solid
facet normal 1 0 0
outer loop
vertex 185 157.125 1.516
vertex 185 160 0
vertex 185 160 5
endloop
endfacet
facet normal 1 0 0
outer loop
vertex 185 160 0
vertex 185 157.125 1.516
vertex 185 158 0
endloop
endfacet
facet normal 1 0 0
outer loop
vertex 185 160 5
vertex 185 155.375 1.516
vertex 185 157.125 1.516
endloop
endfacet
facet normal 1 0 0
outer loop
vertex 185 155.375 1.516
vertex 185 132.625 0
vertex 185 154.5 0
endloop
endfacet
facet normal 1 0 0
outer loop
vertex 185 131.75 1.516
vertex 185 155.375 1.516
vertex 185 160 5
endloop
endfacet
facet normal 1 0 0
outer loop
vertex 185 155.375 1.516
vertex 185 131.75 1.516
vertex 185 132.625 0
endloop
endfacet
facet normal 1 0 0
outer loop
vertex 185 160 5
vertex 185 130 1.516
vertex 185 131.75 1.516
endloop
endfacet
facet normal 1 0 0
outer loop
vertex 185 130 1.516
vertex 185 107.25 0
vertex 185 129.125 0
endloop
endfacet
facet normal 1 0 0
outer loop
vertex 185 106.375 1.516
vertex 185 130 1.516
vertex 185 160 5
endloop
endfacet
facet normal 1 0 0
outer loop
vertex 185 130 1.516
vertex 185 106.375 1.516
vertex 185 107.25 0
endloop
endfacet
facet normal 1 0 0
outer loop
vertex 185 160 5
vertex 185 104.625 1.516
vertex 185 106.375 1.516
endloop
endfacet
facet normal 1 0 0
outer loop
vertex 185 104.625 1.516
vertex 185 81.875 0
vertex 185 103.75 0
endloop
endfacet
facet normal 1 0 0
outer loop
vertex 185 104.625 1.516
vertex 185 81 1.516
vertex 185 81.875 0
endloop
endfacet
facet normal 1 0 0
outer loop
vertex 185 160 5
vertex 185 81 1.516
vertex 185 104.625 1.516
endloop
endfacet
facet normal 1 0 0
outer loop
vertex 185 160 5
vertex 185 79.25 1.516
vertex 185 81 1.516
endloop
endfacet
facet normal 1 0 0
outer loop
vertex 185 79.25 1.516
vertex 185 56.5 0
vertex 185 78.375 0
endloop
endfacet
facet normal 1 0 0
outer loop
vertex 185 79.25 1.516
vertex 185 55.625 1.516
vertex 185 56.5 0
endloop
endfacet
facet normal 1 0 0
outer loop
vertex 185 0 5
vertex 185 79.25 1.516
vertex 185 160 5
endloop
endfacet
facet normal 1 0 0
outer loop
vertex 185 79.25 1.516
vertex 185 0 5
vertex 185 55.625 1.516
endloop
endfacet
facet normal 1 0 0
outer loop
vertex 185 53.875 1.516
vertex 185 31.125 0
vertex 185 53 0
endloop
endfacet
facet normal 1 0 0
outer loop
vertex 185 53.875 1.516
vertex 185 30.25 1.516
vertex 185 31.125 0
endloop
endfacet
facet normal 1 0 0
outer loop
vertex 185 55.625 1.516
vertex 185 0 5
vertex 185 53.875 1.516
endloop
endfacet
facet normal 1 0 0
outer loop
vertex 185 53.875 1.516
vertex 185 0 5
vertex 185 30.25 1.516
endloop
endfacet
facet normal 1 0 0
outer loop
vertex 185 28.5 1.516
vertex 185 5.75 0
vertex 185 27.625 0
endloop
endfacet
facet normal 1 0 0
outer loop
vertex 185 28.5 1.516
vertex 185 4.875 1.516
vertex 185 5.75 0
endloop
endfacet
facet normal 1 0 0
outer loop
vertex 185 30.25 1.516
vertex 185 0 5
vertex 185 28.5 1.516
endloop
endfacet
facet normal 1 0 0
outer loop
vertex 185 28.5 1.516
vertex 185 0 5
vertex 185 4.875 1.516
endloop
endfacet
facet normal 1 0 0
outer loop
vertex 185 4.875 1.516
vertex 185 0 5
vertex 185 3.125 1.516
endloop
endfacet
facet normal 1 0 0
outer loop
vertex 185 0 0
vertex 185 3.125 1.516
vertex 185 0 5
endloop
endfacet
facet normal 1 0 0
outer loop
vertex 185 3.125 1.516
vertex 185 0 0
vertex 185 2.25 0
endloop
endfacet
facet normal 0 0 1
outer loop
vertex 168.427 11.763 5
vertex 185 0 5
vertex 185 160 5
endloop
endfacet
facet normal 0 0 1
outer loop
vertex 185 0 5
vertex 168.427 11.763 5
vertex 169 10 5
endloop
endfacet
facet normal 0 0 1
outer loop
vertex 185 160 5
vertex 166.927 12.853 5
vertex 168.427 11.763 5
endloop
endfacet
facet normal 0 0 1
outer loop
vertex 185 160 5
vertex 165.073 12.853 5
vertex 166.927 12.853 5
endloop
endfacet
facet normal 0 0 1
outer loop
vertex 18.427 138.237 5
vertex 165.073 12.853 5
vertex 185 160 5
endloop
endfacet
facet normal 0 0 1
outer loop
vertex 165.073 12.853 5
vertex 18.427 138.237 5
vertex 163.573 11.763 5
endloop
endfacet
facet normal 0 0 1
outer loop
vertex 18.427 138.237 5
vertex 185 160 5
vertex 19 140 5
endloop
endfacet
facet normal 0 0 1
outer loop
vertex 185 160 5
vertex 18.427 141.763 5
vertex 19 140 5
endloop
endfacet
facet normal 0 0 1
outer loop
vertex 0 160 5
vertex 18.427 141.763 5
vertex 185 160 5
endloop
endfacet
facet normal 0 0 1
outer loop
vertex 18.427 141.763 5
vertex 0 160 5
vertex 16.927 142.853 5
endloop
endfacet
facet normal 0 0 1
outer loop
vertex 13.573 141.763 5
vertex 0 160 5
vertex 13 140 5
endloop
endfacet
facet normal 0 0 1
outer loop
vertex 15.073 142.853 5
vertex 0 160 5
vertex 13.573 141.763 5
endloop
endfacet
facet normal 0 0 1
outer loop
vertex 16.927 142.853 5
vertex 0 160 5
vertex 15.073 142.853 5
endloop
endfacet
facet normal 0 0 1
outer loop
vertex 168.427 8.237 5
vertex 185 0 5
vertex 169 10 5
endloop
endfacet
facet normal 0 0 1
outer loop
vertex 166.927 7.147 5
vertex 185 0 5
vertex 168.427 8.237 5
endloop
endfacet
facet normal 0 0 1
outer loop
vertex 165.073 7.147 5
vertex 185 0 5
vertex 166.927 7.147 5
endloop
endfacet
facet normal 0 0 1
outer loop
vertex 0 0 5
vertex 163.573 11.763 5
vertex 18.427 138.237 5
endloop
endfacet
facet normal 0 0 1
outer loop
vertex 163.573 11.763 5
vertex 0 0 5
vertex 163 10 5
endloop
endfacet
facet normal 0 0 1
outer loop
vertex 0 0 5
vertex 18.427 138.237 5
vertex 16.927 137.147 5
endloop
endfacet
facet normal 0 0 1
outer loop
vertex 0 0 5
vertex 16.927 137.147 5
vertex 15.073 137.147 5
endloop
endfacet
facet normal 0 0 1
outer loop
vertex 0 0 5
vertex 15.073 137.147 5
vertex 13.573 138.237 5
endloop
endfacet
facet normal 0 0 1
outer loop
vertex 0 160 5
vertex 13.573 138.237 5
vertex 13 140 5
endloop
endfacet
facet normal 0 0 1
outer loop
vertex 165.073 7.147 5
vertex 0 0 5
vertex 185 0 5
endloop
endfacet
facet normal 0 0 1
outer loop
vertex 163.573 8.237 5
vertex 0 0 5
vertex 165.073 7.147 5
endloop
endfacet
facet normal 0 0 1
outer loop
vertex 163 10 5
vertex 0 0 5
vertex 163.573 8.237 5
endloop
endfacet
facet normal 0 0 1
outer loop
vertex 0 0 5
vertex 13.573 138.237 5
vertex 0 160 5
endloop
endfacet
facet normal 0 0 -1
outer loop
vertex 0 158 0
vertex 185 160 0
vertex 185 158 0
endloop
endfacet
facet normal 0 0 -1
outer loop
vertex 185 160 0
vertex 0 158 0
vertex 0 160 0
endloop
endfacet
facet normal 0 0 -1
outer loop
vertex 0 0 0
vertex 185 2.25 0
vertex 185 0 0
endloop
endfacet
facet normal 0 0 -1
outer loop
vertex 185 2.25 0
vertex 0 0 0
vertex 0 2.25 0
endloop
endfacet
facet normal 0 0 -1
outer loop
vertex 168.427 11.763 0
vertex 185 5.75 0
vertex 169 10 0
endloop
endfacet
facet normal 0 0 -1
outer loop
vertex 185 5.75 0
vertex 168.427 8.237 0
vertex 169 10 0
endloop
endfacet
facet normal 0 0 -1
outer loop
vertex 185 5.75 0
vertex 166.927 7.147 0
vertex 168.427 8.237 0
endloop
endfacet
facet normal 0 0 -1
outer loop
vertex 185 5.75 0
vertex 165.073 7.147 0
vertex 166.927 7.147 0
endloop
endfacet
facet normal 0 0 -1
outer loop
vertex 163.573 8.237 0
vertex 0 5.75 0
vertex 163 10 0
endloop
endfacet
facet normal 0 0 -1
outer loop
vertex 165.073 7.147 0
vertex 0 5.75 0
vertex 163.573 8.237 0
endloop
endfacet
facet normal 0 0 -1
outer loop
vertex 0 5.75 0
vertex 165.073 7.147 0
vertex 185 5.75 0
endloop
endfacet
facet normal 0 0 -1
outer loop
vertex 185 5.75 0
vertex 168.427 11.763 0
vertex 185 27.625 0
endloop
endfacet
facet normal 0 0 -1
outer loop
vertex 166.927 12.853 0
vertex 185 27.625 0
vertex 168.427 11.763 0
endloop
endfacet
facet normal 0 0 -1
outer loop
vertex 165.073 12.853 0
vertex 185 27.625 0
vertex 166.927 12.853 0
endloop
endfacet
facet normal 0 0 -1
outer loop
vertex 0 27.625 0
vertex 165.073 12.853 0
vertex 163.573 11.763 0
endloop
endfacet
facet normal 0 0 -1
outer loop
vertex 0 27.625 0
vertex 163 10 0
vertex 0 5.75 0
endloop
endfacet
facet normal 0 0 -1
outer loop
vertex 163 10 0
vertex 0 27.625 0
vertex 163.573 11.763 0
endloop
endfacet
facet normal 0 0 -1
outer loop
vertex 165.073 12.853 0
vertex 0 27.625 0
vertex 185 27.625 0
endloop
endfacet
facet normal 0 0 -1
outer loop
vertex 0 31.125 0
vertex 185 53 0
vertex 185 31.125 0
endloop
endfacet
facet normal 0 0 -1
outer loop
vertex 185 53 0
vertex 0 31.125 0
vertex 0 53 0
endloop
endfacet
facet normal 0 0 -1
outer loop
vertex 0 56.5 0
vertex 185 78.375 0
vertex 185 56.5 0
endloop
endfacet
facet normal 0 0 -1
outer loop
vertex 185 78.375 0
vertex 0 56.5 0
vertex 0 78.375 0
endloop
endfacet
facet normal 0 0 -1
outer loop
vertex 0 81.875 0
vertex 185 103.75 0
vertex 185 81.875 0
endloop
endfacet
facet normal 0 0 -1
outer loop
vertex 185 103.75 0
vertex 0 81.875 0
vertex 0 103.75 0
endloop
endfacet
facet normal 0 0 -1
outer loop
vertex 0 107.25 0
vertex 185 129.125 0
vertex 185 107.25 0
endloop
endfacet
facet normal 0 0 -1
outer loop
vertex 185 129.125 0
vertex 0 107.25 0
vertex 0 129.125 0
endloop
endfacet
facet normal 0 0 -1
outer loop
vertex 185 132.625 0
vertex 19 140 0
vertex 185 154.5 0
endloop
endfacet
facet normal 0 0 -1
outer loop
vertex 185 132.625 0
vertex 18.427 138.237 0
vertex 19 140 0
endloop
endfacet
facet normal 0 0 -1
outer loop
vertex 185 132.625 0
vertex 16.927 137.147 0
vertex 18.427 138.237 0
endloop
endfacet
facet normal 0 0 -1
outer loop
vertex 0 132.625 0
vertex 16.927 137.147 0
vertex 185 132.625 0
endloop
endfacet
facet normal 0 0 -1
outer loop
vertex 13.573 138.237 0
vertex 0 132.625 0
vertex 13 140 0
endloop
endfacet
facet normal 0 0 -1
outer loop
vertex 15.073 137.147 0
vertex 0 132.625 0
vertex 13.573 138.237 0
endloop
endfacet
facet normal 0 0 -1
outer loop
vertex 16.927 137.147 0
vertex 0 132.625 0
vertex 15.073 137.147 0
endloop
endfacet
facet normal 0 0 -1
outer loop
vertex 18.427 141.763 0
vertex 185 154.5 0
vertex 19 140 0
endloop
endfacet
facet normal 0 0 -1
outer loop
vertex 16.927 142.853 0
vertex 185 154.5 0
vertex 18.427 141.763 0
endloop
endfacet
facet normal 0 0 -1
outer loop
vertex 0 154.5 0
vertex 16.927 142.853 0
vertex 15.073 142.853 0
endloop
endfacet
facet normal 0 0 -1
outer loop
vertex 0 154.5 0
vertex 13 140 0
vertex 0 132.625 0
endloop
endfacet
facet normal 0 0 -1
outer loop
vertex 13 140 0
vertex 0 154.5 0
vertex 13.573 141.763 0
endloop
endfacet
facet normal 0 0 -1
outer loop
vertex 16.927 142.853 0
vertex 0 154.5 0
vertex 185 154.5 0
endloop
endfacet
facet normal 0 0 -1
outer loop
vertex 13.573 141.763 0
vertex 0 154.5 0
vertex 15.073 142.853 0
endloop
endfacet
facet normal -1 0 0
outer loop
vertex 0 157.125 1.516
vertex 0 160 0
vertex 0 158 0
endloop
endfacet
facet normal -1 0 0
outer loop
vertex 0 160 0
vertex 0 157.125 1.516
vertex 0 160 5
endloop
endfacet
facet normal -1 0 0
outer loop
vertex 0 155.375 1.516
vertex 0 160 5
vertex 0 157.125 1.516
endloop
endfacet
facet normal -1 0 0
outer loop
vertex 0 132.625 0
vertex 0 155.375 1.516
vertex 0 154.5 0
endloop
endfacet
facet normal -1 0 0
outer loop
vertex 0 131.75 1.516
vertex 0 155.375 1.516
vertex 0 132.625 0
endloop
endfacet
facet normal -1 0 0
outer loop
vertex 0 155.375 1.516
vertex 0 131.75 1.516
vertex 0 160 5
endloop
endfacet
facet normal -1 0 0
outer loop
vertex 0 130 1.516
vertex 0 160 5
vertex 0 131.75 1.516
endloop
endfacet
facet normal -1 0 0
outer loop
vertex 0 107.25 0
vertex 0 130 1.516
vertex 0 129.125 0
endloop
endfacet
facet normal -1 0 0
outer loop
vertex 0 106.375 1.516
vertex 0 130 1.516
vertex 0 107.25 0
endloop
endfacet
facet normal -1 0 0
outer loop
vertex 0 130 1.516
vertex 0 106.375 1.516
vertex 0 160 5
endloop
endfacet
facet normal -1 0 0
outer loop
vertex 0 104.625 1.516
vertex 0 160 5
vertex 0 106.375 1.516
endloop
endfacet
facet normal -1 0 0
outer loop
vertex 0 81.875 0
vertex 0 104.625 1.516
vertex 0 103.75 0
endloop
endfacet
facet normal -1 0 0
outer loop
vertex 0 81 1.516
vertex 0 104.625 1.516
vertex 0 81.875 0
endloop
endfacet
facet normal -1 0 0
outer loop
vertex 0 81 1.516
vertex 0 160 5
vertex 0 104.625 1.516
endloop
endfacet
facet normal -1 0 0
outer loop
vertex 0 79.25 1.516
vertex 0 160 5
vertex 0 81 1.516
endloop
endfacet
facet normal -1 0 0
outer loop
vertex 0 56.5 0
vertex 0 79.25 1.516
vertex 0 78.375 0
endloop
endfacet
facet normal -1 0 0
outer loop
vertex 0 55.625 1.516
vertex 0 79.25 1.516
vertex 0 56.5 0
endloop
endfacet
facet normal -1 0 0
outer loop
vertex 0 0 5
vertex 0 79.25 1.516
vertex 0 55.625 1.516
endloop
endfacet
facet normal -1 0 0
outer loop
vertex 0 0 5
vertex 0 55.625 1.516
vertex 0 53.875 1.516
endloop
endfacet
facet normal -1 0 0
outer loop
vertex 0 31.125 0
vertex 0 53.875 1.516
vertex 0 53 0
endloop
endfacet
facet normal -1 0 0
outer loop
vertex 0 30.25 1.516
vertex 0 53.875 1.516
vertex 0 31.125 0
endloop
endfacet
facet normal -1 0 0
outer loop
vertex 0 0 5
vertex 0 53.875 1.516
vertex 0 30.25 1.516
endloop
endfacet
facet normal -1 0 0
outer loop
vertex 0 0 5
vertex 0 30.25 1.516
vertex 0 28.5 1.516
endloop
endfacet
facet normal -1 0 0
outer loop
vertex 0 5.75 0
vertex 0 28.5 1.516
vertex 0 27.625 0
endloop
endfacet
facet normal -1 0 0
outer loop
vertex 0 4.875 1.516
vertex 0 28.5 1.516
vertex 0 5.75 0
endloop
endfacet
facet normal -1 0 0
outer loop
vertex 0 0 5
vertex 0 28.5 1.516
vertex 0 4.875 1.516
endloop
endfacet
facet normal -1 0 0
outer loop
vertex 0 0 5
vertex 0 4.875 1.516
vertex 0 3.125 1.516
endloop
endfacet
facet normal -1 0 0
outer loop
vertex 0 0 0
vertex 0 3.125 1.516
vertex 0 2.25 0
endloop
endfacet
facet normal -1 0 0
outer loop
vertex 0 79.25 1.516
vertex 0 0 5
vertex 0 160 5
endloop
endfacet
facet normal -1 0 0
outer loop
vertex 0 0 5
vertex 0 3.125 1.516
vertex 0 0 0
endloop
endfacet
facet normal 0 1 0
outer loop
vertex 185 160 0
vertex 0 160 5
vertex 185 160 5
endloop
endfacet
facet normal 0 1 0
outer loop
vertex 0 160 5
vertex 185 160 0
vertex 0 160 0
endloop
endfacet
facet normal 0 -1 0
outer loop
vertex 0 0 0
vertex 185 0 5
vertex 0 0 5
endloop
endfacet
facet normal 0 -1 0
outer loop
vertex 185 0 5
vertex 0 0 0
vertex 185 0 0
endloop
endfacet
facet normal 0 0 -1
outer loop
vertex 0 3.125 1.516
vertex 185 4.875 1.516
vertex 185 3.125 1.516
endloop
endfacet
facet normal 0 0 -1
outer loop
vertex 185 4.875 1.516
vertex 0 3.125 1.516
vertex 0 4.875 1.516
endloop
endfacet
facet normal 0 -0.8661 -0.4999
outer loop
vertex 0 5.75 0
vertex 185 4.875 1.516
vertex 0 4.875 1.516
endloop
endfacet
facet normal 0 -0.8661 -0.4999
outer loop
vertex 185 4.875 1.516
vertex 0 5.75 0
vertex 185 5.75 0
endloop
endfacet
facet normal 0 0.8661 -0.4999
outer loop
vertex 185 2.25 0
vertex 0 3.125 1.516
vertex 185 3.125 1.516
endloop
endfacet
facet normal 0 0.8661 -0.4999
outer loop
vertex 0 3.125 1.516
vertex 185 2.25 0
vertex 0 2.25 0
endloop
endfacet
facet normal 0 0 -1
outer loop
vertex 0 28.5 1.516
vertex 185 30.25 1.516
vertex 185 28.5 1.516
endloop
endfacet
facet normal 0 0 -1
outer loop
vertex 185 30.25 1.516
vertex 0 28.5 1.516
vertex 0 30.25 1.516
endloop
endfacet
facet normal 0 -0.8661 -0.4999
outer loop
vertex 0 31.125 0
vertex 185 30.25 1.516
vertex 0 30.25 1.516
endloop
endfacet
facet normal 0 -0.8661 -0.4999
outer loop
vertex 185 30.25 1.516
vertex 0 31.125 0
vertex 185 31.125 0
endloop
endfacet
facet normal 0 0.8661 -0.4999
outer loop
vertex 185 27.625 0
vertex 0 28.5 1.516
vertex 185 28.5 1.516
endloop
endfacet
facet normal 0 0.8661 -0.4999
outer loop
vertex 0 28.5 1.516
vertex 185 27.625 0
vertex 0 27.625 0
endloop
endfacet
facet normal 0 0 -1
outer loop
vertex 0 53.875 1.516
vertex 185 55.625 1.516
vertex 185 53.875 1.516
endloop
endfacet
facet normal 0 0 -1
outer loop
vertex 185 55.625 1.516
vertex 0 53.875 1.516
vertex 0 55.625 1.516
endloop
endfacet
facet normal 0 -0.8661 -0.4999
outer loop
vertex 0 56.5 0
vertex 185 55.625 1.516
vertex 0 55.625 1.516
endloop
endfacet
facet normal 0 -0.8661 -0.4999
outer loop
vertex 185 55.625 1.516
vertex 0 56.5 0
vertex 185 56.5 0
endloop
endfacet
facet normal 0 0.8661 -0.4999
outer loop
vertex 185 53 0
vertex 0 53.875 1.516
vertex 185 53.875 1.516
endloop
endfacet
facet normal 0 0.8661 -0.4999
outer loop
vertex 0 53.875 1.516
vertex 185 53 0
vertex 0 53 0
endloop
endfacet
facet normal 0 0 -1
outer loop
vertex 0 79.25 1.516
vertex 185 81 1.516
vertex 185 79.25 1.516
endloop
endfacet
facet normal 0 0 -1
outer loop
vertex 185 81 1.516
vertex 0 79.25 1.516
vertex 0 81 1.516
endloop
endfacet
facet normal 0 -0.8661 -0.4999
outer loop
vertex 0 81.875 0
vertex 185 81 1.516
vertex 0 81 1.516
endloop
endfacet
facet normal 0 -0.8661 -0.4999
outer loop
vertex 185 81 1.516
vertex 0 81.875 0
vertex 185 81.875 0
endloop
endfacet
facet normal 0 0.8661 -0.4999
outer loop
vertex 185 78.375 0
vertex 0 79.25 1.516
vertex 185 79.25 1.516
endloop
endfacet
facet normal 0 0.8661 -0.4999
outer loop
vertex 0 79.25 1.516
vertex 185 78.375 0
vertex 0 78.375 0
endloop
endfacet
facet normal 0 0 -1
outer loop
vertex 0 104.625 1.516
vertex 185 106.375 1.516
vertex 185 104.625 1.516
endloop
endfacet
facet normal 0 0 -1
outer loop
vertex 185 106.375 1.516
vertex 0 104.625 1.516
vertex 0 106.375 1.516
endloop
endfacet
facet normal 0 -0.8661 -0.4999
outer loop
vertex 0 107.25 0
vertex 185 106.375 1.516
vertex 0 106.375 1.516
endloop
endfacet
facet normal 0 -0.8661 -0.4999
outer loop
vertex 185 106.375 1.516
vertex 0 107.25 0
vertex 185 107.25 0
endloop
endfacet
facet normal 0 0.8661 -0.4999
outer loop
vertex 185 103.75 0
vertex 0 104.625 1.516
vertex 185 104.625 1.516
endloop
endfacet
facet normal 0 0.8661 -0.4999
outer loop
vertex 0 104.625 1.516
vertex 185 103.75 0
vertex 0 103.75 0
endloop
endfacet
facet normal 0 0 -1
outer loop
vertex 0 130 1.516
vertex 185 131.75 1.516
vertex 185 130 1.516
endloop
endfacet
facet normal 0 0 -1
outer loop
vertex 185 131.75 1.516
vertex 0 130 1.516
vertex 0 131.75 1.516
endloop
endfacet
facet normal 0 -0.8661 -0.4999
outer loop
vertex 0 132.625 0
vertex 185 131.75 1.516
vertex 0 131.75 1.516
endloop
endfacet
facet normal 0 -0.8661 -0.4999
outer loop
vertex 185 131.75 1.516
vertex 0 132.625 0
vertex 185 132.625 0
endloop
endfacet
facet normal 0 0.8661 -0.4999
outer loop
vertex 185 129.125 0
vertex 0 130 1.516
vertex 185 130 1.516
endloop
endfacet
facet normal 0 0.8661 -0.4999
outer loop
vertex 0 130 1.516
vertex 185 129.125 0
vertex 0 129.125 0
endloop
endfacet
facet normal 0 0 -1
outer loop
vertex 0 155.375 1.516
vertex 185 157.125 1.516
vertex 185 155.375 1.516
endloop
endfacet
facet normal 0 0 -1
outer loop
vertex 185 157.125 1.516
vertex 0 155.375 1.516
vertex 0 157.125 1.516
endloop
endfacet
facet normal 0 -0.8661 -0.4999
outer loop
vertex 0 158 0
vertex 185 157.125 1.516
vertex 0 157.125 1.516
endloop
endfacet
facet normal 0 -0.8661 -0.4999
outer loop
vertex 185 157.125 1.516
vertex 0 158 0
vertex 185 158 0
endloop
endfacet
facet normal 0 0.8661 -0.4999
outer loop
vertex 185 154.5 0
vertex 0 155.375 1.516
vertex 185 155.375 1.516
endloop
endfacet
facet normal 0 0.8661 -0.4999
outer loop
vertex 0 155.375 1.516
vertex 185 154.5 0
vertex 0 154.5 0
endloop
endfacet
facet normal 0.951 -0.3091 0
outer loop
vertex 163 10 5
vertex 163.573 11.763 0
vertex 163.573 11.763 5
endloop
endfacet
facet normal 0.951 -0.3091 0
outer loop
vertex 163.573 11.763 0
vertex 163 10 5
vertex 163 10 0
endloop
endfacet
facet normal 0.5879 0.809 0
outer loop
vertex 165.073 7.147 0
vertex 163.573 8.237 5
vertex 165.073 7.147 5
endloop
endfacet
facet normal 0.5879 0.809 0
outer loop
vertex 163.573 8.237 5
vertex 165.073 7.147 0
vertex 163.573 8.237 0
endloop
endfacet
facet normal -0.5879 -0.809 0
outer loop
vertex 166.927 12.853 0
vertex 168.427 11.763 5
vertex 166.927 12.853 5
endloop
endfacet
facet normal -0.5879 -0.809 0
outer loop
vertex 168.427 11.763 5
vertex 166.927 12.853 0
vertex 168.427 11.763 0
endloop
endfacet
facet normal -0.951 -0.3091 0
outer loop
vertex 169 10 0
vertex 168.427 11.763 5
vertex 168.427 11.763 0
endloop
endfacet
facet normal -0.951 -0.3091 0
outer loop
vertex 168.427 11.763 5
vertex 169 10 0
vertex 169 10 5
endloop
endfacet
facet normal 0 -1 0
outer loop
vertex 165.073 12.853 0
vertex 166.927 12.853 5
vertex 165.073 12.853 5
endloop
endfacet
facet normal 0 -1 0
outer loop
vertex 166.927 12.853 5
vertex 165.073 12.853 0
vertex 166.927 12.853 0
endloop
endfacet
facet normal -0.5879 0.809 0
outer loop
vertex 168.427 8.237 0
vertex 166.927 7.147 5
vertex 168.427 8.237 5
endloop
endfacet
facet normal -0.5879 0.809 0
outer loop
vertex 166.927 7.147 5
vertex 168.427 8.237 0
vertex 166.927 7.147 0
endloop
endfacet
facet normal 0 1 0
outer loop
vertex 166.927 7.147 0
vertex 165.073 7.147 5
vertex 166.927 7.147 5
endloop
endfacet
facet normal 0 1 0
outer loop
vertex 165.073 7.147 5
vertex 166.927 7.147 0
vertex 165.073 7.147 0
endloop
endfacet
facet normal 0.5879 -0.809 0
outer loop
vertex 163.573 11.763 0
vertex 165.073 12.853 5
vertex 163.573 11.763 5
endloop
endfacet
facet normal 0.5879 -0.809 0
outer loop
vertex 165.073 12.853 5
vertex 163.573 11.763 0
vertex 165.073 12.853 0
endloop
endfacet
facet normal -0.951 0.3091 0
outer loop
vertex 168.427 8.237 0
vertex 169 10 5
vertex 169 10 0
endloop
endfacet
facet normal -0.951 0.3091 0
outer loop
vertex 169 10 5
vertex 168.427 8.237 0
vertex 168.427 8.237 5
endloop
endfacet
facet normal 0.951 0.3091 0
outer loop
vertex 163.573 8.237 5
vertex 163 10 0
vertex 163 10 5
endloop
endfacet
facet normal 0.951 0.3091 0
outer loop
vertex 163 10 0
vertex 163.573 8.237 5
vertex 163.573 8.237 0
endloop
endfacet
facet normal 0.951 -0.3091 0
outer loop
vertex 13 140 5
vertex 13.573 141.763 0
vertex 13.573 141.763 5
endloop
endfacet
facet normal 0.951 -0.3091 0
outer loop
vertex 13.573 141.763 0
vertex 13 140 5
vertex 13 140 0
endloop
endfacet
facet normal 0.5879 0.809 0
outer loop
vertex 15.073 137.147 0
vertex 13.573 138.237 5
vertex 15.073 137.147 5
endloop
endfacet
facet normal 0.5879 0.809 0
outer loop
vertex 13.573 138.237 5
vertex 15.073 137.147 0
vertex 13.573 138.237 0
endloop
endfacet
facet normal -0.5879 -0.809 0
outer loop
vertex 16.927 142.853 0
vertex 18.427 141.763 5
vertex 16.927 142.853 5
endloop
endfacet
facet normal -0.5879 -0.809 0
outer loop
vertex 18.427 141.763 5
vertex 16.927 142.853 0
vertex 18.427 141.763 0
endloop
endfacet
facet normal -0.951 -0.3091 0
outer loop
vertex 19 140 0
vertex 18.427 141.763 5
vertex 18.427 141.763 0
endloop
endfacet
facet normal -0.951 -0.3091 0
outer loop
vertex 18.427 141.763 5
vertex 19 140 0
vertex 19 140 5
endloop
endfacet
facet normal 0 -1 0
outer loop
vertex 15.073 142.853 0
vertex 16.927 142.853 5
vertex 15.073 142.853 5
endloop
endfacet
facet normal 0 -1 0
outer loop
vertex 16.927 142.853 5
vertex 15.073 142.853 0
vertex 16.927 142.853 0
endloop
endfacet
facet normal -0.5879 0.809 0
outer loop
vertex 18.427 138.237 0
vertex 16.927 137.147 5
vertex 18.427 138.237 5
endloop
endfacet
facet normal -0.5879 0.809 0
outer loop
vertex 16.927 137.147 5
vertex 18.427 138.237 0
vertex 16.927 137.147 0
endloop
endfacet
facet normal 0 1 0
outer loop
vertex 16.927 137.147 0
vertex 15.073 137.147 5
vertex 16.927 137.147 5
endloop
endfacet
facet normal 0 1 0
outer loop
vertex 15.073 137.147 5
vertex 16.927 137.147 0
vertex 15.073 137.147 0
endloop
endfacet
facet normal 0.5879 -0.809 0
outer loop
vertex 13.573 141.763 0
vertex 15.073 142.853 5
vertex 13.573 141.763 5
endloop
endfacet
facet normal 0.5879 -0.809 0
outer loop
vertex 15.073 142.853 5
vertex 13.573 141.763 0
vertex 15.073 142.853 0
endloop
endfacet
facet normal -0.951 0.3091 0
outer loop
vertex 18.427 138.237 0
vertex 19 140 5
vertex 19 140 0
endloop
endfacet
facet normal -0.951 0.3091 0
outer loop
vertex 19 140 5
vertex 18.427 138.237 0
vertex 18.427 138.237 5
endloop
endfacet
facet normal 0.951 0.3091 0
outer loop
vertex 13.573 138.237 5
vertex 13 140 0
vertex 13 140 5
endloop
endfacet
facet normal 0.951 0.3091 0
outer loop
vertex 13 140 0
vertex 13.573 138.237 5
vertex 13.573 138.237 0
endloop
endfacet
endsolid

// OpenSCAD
//Thrustmaster T16000 Throttle mounting plate

//Used to mount a T16000 Throttle to a wire shelving rack used as a lap-basd HOTAS setup

// (C) CC BY-SA 2017 by Vincent S. Chernesky under a Creative Commons - Attribution - Sharealike License

StartPosition =4; // Adjust where the first wire is relative to the Y axis
HoleStartPosition=16;//Adjust where the screw holes are relative to the Y axis
wireSpacing=203/8;//Adjust to the distance between your wires, mine was a little more than 25mm between wires
PlateLength=160;//Length of Plate
PlateWidth=185;//Width of Plate
PlateHeight=5;//Height of Plate
WireDiameter=3.5;//Diameter of your wire, I added 1mm to the width of the wire (2.5mm) to add some 'give' to the fitment
HoleDiameter=6; //M6 screw diameter

union(){
    difference(){
        //Baseplate
        cube(size=[PlateWidth,PlateLength,PlateHeight],center=false);
        //First rod cutout
        rotate([90,0,90])
        translate([StartPosition,0,PlateWidth/2])
        cylinder(h=PlateWidth,d=WireDiameter,center=true);
        //Second rod cutout
        rotate([90,0,90])
        translate([StartPosition+wireSpacing,0,PlateWidth/2])
        cylinder(h=PlateWidth,d=WireDiameter,center=true);
        //Third rod cutout
        rotate([90,0,90])
        translate([StartPosition+(2*wireSpacing),0,PlateWidth/2])
        cylinder(h=PlateWidth,d=WireDiameter,center=true);
        //Fourth rod cutout
        rotate([90,0,90])
        translate([StartPosition+(3*wireSpacing),0,PlateWidth/2])
        cylinder(h=PlateWidth,d=WireDiameter,center=true);
        //Fifth rod cutout
        rotate([90,0,90])
        translate([StartPosition+(4*wireSpacing),0,PlateWidth/2])
        cylinder(h=PlateWidth,d=WireDiameter,center=true);
        //Sixth rod cutout
        rotate([90,0,90])
        translate([StartPosition+(5*wireSpacing),0,PlateWidth/2])
        cylinder(h=PlateWidth,d=WireDiameter,center=true);
        //Seventh rod cutout
        rotate([90,0,90])
        translate([StartPosition+(6*wireSpacing),0,PlateWidth/2])
        cylinder(h=PlateWidth,d=WireDiameter,center=true);
        //Eigth rod cutout
        rotate([90,0,90])
        translate([StartPosition+(7*wireSpacing),0,PlateWidth/2])
        cylinder(h=PlateWidth,d=WireDiameter,center=true);
        //First Screw Hole
        translate([HoleStartPosition+150,10,0])
        cylinder(h=PlateHeight,d=HoleDiameter,center=false);
        //Second Screw Hole
        translate([HoleStartPosition,10+130,0])
        cylinder(h=PlateHeight,d=HoleDiameter,center=false);
        
    }
}
